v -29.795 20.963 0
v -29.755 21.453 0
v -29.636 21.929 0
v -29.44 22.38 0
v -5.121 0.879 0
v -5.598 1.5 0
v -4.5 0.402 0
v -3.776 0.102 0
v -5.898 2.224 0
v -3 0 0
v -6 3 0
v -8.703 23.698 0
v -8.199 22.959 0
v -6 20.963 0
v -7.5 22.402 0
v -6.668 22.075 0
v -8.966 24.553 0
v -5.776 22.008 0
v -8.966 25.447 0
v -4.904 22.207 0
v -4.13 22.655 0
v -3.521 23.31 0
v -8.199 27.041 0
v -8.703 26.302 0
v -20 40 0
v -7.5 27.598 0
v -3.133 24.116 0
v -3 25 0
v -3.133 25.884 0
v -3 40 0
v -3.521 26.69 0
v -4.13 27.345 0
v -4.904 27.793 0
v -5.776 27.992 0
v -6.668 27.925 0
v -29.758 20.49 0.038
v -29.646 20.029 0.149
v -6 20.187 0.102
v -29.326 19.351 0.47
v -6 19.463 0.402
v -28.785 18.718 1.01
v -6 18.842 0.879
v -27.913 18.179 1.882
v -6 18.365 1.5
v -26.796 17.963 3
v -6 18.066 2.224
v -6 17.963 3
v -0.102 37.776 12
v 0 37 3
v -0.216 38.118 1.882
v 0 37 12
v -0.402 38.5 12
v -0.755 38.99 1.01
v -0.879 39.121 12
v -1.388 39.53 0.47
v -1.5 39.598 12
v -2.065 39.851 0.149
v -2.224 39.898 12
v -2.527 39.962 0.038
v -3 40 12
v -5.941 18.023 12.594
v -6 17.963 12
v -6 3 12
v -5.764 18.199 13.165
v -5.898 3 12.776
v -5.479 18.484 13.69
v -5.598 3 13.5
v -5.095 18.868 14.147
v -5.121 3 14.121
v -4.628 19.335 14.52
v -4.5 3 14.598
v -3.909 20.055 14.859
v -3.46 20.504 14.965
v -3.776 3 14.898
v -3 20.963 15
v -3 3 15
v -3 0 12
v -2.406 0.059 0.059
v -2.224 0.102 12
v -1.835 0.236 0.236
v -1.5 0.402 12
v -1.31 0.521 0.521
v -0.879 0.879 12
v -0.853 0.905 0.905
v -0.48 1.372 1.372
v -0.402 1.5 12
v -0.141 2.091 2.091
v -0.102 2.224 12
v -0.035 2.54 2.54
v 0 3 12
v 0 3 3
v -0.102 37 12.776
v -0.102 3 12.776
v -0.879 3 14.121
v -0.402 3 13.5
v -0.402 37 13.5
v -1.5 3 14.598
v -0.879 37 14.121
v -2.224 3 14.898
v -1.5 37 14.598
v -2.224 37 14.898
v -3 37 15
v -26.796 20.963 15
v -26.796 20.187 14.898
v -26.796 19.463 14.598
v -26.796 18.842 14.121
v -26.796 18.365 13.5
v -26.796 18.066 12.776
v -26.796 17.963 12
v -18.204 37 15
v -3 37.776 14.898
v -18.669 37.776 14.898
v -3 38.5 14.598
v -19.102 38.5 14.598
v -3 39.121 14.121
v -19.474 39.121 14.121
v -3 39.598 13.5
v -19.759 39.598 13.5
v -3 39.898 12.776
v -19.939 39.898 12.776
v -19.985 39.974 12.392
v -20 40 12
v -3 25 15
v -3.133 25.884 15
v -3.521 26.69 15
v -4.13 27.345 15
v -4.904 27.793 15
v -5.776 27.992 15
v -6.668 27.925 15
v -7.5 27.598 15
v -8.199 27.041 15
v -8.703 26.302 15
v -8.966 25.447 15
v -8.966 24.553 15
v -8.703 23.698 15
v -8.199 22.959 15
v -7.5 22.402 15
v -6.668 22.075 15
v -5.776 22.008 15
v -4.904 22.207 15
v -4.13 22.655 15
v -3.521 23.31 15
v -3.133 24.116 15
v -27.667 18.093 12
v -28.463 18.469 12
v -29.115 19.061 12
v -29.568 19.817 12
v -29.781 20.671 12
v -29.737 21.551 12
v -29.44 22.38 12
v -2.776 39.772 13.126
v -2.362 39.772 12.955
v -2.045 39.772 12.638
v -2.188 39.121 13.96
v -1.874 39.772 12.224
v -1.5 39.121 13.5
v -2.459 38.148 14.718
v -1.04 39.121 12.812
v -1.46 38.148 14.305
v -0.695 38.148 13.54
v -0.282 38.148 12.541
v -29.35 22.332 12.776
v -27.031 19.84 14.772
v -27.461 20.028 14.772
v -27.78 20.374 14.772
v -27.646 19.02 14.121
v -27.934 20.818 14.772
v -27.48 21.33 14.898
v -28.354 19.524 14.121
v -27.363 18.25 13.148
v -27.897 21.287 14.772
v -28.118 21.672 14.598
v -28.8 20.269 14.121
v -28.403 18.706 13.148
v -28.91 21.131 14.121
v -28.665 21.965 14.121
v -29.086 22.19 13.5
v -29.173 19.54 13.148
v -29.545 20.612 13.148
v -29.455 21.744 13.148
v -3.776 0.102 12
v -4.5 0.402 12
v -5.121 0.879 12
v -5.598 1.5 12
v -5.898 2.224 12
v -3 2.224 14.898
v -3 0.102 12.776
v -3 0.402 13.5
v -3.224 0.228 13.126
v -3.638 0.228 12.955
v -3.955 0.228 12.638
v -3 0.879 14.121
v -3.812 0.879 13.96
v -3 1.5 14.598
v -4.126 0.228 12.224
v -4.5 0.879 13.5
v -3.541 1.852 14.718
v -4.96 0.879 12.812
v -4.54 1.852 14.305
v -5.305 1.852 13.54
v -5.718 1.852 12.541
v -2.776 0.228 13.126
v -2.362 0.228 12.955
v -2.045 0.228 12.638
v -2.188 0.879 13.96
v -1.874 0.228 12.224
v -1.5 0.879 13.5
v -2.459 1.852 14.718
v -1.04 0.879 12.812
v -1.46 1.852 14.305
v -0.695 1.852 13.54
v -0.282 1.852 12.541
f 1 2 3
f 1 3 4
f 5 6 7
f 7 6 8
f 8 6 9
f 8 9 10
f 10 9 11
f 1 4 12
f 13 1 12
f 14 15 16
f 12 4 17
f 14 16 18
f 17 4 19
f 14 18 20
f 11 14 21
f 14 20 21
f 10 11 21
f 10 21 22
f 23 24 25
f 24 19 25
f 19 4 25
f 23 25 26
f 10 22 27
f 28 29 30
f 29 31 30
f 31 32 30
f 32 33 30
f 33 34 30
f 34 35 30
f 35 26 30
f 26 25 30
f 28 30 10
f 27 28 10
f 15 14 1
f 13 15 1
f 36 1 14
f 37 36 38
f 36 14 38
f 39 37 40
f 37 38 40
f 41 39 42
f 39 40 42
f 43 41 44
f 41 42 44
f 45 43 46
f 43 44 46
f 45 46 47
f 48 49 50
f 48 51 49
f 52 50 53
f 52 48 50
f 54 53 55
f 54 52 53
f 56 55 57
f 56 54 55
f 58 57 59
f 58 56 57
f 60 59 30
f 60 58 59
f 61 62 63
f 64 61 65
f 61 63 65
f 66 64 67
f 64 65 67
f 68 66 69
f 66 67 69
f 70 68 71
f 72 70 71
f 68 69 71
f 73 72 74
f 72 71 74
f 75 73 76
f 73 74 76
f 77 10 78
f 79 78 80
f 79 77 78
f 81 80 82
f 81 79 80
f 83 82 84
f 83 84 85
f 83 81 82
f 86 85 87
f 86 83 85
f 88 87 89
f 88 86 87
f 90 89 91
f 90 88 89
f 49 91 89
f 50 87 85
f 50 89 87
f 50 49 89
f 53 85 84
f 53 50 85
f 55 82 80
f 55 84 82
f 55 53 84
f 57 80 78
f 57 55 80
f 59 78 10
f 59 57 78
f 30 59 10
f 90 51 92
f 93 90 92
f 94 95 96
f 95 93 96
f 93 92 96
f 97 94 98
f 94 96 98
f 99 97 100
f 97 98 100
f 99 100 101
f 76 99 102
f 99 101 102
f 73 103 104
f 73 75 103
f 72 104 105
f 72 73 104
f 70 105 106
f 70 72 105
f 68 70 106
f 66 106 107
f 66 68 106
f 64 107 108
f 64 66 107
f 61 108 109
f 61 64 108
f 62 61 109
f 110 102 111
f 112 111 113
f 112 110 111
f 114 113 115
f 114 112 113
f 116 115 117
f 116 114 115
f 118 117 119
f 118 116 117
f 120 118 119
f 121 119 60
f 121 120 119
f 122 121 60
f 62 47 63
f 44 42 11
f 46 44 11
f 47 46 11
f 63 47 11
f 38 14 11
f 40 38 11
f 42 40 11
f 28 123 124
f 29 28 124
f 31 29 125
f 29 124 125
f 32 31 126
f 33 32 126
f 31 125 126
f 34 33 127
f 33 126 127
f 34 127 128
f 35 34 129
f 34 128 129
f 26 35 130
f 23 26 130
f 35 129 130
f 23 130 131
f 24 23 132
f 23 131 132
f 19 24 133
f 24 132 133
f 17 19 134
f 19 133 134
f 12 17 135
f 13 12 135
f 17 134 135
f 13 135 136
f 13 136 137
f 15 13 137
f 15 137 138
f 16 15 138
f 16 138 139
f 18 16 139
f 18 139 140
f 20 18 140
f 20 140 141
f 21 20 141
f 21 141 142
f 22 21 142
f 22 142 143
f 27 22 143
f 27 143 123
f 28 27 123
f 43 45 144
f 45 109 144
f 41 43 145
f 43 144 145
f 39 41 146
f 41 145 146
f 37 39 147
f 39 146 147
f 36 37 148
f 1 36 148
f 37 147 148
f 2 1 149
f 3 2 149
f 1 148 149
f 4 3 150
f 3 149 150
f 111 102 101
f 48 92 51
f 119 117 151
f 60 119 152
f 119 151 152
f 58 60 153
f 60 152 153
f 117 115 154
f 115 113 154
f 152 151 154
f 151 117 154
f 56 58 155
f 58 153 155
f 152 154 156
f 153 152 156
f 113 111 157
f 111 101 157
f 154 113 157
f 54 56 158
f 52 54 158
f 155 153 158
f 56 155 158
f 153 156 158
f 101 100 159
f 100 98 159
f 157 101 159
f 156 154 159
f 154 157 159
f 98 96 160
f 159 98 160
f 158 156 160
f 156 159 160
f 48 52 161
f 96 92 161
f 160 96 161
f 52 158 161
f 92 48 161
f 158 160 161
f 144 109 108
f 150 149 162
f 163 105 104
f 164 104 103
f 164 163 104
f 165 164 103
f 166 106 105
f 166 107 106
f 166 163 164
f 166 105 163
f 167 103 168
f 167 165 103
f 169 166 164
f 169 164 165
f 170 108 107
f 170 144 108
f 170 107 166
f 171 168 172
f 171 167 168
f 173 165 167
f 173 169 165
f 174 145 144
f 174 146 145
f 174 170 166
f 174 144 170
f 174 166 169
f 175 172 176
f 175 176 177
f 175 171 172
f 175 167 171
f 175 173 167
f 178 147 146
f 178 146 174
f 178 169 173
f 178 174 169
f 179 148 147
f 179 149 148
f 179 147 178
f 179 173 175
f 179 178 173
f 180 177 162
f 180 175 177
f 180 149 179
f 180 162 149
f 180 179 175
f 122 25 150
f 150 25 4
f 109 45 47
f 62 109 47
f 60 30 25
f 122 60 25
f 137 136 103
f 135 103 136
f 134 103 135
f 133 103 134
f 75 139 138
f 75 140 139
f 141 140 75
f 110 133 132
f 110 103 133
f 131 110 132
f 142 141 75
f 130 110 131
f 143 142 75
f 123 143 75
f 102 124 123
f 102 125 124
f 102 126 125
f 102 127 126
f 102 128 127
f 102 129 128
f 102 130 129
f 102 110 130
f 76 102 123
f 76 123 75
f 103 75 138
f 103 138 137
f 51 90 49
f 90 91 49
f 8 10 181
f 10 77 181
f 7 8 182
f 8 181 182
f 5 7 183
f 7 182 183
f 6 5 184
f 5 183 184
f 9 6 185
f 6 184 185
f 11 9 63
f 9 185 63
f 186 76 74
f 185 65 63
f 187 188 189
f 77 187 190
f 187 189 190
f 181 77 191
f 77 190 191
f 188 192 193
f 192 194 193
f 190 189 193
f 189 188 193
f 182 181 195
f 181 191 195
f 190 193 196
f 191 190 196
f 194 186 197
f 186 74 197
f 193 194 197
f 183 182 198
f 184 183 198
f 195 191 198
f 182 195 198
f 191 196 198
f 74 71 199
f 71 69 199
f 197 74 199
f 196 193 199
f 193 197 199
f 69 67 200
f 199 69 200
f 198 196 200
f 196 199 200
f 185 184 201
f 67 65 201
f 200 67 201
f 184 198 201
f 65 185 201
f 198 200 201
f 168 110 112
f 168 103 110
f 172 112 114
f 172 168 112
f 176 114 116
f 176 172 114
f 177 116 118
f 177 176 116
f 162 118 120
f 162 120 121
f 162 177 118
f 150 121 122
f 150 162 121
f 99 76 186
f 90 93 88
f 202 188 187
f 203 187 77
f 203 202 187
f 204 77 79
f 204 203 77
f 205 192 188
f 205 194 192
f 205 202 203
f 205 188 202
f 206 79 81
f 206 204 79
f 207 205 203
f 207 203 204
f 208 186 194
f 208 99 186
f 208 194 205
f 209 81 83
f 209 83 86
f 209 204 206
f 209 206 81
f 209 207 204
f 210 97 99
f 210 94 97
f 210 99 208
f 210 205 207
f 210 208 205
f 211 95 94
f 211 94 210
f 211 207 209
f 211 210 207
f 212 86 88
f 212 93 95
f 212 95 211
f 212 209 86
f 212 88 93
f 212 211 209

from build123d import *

# Parameters (mm, degrees)
F1_DEPTH = 15
F2_R     = 3
F3_DEPTH = 25
F4_R     = 2.99999


# Not quite as in the source:
# - a fillet or chamfer is up to 0.001 mm smaller than in the source, because OpenCascade refuses the exact size


with BuildPart() as f1:
    # F0 (on Top) → F1 (new body)
    with BuildSketch(Plane.XY):
        Polygon((-6, 0), (0, 0), (0, 40), (-20, 40), (-31.8061554718, 17.9633329885), (-6, 17.9633329885), align=None)
    extrude(amount=F1_DEPTH)

    # F2 (on face) → F3 (cut)
    with BuildSketch(Plane.XY.offset(15)):
        with Locations((-6, 25)):
            Circle(F2_R)
    extrude(amount=-F3_DEPTH, mode=Mode.SUBTRACT)

    # F4 (radius 3 in the source; OpenCascade refuses exactly that, so slightly less here)
    f4_edges = [f1.edges().sort_by_distance(p)[0] for p in [
        (0, 20, 15),
        (-6, 8.981666, 15),
        (-18.903078, 17.963333, 15),
        (-25.903078, 28.981666, 15),
        (-10, 40, 15),
        (0, 40, 7.5),
        (-3, 0, 15),
        (0, 0, 7.5),
        (0, 20, 0),
        (-18.903078, 17.963333, 0),
        (-31.806155, 17.963333, 7.5),
        (-6, 0, 7.5),
    ]]
    fillet(f4_edges, radius=F4_R)


solid = f1.part
